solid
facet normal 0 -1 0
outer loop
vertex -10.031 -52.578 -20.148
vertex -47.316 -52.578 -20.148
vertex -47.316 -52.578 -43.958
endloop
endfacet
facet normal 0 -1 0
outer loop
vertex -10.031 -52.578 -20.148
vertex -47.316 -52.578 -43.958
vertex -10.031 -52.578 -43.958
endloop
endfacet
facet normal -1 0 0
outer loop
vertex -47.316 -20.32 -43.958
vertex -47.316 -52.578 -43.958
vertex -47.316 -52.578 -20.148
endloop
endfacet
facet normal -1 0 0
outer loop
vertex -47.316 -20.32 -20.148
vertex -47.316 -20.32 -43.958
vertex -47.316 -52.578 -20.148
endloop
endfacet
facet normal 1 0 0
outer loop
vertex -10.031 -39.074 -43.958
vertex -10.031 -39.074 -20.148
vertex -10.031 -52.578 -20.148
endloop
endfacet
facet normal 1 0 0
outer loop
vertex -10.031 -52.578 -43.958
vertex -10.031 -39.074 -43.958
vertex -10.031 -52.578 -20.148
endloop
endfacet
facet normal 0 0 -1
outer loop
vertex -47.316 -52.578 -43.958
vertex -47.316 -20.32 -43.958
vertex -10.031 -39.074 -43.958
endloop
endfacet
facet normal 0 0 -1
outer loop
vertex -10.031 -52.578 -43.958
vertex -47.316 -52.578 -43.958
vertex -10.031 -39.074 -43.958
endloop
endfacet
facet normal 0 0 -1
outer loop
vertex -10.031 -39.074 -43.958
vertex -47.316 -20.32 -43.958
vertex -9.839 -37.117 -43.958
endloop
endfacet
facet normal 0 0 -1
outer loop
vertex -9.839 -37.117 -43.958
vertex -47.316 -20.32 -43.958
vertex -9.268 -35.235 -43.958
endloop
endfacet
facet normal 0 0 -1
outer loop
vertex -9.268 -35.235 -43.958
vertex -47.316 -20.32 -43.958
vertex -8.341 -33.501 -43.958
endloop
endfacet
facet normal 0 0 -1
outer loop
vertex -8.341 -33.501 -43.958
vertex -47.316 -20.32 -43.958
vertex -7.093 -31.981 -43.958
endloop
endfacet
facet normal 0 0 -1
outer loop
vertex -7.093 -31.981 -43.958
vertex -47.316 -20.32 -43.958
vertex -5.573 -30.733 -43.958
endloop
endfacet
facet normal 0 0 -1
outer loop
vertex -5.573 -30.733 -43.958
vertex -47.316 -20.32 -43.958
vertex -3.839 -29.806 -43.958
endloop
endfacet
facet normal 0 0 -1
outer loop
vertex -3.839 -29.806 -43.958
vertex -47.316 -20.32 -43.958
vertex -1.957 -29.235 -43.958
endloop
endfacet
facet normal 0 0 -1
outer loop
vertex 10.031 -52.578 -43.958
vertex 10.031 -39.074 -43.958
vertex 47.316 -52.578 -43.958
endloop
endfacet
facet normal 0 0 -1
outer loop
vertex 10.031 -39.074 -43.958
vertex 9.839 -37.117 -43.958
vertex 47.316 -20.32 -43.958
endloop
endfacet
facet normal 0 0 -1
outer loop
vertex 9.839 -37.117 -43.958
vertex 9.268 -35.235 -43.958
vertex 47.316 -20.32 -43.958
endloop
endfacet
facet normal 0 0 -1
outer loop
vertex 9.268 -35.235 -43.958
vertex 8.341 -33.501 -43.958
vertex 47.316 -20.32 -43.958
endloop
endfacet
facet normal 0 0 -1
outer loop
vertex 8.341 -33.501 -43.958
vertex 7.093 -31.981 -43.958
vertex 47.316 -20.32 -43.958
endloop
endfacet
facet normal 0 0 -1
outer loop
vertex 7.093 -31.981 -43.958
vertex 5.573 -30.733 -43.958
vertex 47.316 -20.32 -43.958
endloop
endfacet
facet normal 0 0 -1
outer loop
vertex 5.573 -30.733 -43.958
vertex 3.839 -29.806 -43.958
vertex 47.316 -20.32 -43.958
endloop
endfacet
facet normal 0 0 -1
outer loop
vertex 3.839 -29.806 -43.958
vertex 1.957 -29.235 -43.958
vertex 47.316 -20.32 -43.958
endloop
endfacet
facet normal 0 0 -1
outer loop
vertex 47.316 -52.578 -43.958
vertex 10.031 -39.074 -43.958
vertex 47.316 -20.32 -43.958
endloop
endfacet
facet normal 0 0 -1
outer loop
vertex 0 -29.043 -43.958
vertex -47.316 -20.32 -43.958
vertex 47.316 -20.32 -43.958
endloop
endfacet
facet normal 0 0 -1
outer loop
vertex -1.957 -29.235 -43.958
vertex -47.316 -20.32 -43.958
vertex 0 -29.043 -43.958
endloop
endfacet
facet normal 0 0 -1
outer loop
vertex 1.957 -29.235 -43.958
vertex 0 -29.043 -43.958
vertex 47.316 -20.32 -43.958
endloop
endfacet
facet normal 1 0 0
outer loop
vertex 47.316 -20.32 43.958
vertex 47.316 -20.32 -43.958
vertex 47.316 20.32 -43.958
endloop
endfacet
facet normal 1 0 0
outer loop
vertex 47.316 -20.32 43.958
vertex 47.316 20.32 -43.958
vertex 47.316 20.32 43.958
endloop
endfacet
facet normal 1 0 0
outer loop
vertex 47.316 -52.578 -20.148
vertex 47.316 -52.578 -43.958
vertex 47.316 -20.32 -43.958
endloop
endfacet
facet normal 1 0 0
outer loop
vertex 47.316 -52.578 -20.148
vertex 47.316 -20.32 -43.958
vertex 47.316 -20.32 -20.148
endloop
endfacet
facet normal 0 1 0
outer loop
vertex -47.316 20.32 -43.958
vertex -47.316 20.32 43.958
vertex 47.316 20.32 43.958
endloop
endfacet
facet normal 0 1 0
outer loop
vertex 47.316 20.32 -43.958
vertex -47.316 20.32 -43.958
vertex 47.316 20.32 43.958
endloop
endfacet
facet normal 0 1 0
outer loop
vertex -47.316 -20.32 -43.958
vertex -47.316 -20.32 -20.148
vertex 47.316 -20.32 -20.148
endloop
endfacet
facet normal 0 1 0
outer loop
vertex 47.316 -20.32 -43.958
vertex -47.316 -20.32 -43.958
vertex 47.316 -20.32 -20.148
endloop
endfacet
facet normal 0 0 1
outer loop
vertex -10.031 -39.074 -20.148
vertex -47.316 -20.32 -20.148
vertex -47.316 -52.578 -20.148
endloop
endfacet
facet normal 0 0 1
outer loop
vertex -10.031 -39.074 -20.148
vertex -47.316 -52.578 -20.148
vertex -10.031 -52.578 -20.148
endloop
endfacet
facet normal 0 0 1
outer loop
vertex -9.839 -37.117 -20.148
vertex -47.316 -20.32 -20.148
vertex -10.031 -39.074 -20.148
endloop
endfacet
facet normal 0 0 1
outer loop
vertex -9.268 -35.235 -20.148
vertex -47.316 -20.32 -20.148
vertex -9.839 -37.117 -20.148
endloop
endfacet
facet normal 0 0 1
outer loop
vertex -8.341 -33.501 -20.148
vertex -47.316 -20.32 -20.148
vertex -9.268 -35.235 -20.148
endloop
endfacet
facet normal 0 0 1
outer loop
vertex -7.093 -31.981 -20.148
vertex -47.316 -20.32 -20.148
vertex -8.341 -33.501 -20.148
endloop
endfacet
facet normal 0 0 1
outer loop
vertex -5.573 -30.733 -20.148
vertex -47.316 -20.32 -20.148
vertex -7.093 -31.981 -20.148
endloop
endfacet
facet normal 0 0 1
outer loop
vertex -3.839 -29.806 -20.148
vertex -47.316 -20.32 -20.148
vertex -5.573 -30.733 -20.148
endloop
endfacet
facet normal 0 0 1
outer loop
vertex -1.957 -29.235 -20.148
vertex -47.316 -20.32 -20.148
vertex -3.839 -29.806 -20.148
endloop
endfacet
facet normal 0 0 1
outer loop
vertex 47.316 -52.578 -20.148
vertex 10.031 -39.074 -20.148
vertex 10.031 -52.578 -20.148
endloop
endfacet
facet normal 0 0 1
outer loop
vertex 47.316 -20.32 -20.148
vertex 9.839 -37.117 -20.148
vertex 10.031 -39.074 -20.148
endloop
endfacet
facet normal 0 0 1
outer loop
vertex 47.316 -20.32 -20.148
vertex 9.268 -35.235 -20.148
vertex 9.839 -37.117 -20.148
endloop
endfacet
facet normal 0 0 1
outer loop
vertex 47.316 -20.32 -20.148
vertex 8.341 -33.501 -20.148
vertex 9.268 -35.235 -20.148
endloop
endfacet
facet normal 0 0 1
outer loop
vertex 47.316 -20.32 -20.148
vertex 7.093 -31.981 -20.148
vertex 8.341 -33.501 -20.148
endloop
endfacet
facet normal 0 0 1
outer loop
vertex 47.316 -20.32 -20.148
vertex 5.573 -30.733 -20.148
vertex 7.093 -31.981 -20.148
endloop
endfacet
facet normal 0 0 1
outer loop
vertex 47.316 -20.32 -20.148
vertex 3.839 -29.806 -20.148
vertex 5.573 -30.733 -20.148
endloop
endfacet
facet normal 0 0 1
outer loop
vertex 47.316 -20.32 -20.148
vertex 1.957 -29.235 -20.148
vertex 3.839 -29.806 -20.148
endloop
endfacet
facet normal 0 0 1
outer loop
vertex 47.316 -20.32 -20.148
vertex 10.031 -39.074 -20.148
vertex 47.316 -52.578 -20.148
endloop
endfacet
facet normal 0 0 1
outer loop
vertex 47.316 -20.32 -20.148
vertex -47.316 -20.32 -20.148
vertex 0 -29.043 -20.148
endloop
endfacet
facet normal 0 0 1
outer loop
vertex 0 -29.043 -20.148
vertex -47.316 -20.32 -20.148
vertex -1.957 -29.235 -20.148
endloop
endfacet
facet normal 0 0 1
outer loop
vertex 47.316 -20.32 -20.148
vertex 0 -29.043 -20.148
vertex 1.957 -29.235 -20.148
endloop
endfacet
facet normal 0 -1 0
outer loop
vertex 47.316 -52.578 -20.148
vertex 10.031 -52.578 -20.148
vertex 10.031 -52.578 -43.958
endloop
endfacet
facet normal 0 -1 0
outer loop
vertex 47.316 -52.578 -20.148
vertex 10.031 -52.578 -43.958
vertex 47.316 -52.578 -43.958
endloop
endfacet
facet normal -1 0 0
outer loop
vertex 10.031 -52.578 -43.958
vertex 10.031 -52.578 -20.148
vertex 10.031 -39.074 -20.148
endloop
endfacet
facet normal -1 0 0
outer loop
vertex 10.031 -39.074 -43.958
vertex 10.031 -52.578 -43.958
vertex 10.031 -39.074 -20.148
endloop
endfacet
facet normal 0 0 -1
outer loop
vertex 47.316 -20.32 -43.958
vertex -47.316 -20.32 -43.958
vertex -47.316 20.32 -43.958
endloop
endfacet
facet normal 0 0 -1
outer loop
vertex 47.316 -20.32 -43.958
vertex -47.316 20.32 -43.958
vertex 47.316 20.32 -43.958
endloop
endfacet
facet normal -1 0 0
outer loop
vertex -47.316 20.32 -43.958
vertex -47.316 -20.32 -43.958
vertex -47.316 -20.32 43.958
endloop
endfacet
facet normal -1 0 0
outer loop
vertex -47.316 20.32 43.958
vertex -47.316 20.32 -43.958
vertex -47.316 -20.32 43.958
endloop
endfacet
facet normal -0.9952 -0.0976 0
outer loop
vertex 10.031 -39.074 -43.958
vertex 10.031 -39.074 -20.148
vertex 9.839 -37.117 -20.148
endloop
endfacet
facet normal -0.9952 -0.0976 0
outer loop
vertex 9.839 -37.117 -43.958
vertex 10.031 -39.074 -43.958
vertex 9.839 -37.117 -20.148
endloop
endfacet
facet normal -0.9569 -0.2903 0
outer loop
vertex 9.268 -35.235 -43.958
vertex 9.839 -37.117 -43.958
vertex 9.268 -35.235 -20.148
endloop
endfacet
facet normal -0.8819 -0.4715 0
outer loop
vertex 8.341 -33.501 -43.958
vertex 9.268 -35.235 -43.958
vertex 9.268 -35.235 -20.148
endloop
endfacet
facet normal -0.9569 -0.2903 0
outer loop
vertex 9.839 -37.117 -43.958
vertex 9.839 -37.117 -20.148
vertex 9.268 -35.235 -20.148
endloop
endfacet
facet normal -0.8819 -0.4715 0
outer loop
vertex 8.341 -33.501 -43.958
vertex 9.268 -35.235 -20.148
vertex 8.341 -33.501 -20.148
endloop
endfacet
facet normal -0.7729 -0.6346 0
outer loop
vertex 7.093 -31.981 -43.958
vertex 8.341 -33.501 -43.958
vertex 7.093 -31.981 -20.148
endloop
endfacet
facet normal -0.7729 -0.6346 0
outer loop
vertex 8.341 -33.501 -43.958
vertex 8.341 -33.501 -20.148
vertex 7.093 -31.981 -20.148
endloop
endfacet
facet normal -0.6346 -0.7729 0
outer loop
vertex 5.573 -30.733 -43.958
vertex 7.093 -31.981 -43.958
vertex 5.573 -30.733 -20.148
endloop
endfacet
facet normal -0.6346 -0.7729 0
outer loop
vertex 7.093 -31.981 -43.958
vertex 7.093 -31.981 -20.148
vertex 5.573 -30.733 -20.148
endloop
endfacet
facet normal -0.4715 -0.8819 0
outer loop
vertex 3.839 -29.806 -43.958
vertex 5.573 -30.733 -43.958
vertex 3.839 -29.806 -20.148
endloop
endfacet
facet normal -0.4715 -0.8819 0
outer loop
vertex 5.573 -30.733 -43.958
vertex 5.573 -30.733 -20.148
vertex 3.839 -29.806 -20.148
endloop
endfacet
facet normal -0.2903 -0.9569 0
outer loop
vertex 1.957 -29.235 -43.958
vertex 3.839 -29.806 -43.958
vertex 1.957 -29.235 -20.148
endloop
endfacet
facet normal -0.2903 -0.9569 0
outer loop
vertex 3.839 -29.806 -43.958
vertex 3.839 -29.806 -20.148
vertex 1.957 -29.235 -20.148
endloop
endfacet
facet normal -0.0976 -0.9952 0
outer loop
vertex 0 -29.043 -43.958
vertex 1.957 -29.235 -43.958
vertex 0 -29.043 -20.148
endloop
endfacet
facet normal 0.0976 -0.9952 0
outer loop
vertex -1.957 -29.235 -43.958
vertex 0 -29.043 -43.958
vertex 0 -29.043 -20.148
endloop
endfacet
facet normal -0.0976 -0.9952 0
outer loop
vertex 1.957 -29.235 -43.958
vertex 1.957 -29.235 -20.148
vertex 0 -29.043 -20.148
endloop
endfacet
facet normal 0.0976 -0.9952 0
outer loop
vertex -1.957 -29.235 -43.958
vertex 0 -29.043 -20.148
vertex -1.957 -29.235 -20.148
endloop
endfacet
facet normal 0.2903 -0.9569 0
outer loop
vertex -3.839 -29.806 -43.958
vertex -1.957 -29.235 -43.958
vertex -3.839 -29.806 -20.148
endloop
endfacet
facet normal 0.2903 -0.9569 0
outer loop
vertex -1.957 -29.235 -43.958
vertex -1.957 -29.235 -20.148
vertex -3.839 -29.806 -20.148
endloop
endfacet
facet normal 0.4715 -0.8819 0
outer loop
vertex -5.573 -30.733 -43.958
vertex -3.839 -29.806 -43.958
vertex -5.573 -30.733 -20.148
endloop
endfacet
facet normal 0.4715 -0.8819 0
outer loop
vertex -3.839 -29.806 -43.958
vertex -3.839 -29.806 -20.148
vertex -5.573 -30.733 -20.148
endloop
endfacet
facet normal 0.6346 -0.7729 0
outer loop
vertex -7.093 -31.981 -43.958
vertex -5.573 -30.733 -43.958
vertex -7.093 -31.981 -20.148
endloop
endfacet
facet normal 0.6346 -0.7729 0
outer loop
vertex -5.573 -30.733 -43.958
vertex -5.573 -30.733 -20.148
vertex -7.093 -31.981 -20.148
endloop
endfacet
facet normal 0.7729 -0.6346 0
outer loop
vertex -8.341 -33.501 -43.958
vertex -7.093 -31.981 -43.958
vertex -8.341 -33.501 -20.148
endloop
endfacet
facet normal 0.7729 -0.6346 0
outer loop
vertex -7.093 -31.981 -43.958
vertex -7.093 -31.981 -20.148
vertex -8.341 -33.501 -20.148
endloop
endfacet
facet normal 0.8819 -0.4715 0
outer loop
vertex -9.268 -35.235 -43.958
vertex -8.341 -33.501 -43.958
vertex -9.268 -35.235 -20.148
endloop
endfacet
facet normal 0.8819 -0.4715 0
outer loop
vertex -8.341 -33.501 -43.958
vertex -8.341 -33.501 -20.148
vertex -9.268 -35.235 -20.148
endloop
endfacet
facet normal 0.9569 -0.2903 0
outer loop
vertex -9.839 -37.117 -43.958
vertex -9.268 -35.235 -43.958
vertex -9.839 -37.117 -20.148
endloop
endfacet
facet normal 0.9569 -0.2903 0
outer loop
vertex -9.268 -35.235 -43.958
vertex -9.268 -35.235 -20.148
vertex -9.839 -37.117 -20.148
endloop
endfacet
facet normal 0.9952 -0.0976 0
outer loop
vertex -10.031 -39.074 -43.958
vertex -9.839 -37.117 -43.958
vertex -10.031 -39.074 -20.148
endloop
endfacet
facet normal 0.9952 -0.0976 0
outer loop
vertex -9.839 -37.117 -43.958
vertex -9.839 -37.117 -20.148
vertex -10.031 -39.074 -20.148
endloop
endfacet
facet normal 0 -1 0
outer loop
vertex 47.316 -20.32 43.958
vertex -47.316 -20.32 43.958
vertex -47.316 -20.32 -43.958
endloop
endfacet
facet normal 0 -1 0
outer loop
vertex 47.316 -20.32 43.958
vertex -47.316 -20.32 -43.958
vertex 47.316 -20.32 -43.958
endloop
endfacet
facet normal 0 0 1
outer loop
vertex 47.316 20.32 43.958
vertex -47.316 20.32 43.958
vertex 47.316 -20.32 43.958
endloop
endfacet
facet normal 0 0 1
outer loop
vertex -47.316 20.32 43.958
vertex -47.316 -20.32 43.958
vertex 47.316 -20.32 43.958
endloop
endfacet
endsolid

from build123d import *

# Parameters (mm, degrees)
F0_W     = 94.6328788996
F0_H     = 87.9169851542
F1_DEPTH = 20.32
F2_W     = 94.6328788996
F2_H     = 23.8108485937
F3_DEPTH = 32.258
F5_DEPTH = 23.8118485937


with BuildPart() as f1:
    # F0 (on Front) → F1 (new body, symmetric)
    with BuildSketch(Plane.XZ):
        Rectangle(F0_W, F0_H)
    extrude(amount=F1_DEPTH, both=True)


with BuildPart() as f3:
    # F2 (on face) → F3 (new body)
    with BuildSketch(Plane.XZ.offset(20.32)):
        with Locations((0, -32.0530682802)):
            Rectangle(F2_W, F2_H)
    extrude(amount=F3_DEPTH)

    # F4 (on face) → F5 (cut, through all)
    with BuildSketch(Plane.XY.offset(-20.1476439834)):
        with BuildLine():
            ThreePointArc((-10.0314961746, -39.0740061632), (0, -49.1055023379), (10.0314961746, -39.0740061632))
            ThreePointArc((10.0314961746, -39.0740061632), (0, -29.0425099886), (-10.0314961746, -39.0740061632))
        make_face()
        with BuildLine():
            Line((10.0314961746, -52.578), (10.0314961746, -39.0740061632))
            ThreePointArc((10.0314961746, -39.0740061632), (0, -49.1055023379), (-10.0314961746, -39.0740061632))
            Line((-10.0314961746, -39.0740061632), (-10.0314961746, -52.578))
            Line((-10.0314961746, -52.578), (10.0314961746, -52.578))
        make_face()
    extrude(amount=-F5_DEPTH, mode=Mode.SUBTRACT)


solid = Compound([f1.part, f3.part])
